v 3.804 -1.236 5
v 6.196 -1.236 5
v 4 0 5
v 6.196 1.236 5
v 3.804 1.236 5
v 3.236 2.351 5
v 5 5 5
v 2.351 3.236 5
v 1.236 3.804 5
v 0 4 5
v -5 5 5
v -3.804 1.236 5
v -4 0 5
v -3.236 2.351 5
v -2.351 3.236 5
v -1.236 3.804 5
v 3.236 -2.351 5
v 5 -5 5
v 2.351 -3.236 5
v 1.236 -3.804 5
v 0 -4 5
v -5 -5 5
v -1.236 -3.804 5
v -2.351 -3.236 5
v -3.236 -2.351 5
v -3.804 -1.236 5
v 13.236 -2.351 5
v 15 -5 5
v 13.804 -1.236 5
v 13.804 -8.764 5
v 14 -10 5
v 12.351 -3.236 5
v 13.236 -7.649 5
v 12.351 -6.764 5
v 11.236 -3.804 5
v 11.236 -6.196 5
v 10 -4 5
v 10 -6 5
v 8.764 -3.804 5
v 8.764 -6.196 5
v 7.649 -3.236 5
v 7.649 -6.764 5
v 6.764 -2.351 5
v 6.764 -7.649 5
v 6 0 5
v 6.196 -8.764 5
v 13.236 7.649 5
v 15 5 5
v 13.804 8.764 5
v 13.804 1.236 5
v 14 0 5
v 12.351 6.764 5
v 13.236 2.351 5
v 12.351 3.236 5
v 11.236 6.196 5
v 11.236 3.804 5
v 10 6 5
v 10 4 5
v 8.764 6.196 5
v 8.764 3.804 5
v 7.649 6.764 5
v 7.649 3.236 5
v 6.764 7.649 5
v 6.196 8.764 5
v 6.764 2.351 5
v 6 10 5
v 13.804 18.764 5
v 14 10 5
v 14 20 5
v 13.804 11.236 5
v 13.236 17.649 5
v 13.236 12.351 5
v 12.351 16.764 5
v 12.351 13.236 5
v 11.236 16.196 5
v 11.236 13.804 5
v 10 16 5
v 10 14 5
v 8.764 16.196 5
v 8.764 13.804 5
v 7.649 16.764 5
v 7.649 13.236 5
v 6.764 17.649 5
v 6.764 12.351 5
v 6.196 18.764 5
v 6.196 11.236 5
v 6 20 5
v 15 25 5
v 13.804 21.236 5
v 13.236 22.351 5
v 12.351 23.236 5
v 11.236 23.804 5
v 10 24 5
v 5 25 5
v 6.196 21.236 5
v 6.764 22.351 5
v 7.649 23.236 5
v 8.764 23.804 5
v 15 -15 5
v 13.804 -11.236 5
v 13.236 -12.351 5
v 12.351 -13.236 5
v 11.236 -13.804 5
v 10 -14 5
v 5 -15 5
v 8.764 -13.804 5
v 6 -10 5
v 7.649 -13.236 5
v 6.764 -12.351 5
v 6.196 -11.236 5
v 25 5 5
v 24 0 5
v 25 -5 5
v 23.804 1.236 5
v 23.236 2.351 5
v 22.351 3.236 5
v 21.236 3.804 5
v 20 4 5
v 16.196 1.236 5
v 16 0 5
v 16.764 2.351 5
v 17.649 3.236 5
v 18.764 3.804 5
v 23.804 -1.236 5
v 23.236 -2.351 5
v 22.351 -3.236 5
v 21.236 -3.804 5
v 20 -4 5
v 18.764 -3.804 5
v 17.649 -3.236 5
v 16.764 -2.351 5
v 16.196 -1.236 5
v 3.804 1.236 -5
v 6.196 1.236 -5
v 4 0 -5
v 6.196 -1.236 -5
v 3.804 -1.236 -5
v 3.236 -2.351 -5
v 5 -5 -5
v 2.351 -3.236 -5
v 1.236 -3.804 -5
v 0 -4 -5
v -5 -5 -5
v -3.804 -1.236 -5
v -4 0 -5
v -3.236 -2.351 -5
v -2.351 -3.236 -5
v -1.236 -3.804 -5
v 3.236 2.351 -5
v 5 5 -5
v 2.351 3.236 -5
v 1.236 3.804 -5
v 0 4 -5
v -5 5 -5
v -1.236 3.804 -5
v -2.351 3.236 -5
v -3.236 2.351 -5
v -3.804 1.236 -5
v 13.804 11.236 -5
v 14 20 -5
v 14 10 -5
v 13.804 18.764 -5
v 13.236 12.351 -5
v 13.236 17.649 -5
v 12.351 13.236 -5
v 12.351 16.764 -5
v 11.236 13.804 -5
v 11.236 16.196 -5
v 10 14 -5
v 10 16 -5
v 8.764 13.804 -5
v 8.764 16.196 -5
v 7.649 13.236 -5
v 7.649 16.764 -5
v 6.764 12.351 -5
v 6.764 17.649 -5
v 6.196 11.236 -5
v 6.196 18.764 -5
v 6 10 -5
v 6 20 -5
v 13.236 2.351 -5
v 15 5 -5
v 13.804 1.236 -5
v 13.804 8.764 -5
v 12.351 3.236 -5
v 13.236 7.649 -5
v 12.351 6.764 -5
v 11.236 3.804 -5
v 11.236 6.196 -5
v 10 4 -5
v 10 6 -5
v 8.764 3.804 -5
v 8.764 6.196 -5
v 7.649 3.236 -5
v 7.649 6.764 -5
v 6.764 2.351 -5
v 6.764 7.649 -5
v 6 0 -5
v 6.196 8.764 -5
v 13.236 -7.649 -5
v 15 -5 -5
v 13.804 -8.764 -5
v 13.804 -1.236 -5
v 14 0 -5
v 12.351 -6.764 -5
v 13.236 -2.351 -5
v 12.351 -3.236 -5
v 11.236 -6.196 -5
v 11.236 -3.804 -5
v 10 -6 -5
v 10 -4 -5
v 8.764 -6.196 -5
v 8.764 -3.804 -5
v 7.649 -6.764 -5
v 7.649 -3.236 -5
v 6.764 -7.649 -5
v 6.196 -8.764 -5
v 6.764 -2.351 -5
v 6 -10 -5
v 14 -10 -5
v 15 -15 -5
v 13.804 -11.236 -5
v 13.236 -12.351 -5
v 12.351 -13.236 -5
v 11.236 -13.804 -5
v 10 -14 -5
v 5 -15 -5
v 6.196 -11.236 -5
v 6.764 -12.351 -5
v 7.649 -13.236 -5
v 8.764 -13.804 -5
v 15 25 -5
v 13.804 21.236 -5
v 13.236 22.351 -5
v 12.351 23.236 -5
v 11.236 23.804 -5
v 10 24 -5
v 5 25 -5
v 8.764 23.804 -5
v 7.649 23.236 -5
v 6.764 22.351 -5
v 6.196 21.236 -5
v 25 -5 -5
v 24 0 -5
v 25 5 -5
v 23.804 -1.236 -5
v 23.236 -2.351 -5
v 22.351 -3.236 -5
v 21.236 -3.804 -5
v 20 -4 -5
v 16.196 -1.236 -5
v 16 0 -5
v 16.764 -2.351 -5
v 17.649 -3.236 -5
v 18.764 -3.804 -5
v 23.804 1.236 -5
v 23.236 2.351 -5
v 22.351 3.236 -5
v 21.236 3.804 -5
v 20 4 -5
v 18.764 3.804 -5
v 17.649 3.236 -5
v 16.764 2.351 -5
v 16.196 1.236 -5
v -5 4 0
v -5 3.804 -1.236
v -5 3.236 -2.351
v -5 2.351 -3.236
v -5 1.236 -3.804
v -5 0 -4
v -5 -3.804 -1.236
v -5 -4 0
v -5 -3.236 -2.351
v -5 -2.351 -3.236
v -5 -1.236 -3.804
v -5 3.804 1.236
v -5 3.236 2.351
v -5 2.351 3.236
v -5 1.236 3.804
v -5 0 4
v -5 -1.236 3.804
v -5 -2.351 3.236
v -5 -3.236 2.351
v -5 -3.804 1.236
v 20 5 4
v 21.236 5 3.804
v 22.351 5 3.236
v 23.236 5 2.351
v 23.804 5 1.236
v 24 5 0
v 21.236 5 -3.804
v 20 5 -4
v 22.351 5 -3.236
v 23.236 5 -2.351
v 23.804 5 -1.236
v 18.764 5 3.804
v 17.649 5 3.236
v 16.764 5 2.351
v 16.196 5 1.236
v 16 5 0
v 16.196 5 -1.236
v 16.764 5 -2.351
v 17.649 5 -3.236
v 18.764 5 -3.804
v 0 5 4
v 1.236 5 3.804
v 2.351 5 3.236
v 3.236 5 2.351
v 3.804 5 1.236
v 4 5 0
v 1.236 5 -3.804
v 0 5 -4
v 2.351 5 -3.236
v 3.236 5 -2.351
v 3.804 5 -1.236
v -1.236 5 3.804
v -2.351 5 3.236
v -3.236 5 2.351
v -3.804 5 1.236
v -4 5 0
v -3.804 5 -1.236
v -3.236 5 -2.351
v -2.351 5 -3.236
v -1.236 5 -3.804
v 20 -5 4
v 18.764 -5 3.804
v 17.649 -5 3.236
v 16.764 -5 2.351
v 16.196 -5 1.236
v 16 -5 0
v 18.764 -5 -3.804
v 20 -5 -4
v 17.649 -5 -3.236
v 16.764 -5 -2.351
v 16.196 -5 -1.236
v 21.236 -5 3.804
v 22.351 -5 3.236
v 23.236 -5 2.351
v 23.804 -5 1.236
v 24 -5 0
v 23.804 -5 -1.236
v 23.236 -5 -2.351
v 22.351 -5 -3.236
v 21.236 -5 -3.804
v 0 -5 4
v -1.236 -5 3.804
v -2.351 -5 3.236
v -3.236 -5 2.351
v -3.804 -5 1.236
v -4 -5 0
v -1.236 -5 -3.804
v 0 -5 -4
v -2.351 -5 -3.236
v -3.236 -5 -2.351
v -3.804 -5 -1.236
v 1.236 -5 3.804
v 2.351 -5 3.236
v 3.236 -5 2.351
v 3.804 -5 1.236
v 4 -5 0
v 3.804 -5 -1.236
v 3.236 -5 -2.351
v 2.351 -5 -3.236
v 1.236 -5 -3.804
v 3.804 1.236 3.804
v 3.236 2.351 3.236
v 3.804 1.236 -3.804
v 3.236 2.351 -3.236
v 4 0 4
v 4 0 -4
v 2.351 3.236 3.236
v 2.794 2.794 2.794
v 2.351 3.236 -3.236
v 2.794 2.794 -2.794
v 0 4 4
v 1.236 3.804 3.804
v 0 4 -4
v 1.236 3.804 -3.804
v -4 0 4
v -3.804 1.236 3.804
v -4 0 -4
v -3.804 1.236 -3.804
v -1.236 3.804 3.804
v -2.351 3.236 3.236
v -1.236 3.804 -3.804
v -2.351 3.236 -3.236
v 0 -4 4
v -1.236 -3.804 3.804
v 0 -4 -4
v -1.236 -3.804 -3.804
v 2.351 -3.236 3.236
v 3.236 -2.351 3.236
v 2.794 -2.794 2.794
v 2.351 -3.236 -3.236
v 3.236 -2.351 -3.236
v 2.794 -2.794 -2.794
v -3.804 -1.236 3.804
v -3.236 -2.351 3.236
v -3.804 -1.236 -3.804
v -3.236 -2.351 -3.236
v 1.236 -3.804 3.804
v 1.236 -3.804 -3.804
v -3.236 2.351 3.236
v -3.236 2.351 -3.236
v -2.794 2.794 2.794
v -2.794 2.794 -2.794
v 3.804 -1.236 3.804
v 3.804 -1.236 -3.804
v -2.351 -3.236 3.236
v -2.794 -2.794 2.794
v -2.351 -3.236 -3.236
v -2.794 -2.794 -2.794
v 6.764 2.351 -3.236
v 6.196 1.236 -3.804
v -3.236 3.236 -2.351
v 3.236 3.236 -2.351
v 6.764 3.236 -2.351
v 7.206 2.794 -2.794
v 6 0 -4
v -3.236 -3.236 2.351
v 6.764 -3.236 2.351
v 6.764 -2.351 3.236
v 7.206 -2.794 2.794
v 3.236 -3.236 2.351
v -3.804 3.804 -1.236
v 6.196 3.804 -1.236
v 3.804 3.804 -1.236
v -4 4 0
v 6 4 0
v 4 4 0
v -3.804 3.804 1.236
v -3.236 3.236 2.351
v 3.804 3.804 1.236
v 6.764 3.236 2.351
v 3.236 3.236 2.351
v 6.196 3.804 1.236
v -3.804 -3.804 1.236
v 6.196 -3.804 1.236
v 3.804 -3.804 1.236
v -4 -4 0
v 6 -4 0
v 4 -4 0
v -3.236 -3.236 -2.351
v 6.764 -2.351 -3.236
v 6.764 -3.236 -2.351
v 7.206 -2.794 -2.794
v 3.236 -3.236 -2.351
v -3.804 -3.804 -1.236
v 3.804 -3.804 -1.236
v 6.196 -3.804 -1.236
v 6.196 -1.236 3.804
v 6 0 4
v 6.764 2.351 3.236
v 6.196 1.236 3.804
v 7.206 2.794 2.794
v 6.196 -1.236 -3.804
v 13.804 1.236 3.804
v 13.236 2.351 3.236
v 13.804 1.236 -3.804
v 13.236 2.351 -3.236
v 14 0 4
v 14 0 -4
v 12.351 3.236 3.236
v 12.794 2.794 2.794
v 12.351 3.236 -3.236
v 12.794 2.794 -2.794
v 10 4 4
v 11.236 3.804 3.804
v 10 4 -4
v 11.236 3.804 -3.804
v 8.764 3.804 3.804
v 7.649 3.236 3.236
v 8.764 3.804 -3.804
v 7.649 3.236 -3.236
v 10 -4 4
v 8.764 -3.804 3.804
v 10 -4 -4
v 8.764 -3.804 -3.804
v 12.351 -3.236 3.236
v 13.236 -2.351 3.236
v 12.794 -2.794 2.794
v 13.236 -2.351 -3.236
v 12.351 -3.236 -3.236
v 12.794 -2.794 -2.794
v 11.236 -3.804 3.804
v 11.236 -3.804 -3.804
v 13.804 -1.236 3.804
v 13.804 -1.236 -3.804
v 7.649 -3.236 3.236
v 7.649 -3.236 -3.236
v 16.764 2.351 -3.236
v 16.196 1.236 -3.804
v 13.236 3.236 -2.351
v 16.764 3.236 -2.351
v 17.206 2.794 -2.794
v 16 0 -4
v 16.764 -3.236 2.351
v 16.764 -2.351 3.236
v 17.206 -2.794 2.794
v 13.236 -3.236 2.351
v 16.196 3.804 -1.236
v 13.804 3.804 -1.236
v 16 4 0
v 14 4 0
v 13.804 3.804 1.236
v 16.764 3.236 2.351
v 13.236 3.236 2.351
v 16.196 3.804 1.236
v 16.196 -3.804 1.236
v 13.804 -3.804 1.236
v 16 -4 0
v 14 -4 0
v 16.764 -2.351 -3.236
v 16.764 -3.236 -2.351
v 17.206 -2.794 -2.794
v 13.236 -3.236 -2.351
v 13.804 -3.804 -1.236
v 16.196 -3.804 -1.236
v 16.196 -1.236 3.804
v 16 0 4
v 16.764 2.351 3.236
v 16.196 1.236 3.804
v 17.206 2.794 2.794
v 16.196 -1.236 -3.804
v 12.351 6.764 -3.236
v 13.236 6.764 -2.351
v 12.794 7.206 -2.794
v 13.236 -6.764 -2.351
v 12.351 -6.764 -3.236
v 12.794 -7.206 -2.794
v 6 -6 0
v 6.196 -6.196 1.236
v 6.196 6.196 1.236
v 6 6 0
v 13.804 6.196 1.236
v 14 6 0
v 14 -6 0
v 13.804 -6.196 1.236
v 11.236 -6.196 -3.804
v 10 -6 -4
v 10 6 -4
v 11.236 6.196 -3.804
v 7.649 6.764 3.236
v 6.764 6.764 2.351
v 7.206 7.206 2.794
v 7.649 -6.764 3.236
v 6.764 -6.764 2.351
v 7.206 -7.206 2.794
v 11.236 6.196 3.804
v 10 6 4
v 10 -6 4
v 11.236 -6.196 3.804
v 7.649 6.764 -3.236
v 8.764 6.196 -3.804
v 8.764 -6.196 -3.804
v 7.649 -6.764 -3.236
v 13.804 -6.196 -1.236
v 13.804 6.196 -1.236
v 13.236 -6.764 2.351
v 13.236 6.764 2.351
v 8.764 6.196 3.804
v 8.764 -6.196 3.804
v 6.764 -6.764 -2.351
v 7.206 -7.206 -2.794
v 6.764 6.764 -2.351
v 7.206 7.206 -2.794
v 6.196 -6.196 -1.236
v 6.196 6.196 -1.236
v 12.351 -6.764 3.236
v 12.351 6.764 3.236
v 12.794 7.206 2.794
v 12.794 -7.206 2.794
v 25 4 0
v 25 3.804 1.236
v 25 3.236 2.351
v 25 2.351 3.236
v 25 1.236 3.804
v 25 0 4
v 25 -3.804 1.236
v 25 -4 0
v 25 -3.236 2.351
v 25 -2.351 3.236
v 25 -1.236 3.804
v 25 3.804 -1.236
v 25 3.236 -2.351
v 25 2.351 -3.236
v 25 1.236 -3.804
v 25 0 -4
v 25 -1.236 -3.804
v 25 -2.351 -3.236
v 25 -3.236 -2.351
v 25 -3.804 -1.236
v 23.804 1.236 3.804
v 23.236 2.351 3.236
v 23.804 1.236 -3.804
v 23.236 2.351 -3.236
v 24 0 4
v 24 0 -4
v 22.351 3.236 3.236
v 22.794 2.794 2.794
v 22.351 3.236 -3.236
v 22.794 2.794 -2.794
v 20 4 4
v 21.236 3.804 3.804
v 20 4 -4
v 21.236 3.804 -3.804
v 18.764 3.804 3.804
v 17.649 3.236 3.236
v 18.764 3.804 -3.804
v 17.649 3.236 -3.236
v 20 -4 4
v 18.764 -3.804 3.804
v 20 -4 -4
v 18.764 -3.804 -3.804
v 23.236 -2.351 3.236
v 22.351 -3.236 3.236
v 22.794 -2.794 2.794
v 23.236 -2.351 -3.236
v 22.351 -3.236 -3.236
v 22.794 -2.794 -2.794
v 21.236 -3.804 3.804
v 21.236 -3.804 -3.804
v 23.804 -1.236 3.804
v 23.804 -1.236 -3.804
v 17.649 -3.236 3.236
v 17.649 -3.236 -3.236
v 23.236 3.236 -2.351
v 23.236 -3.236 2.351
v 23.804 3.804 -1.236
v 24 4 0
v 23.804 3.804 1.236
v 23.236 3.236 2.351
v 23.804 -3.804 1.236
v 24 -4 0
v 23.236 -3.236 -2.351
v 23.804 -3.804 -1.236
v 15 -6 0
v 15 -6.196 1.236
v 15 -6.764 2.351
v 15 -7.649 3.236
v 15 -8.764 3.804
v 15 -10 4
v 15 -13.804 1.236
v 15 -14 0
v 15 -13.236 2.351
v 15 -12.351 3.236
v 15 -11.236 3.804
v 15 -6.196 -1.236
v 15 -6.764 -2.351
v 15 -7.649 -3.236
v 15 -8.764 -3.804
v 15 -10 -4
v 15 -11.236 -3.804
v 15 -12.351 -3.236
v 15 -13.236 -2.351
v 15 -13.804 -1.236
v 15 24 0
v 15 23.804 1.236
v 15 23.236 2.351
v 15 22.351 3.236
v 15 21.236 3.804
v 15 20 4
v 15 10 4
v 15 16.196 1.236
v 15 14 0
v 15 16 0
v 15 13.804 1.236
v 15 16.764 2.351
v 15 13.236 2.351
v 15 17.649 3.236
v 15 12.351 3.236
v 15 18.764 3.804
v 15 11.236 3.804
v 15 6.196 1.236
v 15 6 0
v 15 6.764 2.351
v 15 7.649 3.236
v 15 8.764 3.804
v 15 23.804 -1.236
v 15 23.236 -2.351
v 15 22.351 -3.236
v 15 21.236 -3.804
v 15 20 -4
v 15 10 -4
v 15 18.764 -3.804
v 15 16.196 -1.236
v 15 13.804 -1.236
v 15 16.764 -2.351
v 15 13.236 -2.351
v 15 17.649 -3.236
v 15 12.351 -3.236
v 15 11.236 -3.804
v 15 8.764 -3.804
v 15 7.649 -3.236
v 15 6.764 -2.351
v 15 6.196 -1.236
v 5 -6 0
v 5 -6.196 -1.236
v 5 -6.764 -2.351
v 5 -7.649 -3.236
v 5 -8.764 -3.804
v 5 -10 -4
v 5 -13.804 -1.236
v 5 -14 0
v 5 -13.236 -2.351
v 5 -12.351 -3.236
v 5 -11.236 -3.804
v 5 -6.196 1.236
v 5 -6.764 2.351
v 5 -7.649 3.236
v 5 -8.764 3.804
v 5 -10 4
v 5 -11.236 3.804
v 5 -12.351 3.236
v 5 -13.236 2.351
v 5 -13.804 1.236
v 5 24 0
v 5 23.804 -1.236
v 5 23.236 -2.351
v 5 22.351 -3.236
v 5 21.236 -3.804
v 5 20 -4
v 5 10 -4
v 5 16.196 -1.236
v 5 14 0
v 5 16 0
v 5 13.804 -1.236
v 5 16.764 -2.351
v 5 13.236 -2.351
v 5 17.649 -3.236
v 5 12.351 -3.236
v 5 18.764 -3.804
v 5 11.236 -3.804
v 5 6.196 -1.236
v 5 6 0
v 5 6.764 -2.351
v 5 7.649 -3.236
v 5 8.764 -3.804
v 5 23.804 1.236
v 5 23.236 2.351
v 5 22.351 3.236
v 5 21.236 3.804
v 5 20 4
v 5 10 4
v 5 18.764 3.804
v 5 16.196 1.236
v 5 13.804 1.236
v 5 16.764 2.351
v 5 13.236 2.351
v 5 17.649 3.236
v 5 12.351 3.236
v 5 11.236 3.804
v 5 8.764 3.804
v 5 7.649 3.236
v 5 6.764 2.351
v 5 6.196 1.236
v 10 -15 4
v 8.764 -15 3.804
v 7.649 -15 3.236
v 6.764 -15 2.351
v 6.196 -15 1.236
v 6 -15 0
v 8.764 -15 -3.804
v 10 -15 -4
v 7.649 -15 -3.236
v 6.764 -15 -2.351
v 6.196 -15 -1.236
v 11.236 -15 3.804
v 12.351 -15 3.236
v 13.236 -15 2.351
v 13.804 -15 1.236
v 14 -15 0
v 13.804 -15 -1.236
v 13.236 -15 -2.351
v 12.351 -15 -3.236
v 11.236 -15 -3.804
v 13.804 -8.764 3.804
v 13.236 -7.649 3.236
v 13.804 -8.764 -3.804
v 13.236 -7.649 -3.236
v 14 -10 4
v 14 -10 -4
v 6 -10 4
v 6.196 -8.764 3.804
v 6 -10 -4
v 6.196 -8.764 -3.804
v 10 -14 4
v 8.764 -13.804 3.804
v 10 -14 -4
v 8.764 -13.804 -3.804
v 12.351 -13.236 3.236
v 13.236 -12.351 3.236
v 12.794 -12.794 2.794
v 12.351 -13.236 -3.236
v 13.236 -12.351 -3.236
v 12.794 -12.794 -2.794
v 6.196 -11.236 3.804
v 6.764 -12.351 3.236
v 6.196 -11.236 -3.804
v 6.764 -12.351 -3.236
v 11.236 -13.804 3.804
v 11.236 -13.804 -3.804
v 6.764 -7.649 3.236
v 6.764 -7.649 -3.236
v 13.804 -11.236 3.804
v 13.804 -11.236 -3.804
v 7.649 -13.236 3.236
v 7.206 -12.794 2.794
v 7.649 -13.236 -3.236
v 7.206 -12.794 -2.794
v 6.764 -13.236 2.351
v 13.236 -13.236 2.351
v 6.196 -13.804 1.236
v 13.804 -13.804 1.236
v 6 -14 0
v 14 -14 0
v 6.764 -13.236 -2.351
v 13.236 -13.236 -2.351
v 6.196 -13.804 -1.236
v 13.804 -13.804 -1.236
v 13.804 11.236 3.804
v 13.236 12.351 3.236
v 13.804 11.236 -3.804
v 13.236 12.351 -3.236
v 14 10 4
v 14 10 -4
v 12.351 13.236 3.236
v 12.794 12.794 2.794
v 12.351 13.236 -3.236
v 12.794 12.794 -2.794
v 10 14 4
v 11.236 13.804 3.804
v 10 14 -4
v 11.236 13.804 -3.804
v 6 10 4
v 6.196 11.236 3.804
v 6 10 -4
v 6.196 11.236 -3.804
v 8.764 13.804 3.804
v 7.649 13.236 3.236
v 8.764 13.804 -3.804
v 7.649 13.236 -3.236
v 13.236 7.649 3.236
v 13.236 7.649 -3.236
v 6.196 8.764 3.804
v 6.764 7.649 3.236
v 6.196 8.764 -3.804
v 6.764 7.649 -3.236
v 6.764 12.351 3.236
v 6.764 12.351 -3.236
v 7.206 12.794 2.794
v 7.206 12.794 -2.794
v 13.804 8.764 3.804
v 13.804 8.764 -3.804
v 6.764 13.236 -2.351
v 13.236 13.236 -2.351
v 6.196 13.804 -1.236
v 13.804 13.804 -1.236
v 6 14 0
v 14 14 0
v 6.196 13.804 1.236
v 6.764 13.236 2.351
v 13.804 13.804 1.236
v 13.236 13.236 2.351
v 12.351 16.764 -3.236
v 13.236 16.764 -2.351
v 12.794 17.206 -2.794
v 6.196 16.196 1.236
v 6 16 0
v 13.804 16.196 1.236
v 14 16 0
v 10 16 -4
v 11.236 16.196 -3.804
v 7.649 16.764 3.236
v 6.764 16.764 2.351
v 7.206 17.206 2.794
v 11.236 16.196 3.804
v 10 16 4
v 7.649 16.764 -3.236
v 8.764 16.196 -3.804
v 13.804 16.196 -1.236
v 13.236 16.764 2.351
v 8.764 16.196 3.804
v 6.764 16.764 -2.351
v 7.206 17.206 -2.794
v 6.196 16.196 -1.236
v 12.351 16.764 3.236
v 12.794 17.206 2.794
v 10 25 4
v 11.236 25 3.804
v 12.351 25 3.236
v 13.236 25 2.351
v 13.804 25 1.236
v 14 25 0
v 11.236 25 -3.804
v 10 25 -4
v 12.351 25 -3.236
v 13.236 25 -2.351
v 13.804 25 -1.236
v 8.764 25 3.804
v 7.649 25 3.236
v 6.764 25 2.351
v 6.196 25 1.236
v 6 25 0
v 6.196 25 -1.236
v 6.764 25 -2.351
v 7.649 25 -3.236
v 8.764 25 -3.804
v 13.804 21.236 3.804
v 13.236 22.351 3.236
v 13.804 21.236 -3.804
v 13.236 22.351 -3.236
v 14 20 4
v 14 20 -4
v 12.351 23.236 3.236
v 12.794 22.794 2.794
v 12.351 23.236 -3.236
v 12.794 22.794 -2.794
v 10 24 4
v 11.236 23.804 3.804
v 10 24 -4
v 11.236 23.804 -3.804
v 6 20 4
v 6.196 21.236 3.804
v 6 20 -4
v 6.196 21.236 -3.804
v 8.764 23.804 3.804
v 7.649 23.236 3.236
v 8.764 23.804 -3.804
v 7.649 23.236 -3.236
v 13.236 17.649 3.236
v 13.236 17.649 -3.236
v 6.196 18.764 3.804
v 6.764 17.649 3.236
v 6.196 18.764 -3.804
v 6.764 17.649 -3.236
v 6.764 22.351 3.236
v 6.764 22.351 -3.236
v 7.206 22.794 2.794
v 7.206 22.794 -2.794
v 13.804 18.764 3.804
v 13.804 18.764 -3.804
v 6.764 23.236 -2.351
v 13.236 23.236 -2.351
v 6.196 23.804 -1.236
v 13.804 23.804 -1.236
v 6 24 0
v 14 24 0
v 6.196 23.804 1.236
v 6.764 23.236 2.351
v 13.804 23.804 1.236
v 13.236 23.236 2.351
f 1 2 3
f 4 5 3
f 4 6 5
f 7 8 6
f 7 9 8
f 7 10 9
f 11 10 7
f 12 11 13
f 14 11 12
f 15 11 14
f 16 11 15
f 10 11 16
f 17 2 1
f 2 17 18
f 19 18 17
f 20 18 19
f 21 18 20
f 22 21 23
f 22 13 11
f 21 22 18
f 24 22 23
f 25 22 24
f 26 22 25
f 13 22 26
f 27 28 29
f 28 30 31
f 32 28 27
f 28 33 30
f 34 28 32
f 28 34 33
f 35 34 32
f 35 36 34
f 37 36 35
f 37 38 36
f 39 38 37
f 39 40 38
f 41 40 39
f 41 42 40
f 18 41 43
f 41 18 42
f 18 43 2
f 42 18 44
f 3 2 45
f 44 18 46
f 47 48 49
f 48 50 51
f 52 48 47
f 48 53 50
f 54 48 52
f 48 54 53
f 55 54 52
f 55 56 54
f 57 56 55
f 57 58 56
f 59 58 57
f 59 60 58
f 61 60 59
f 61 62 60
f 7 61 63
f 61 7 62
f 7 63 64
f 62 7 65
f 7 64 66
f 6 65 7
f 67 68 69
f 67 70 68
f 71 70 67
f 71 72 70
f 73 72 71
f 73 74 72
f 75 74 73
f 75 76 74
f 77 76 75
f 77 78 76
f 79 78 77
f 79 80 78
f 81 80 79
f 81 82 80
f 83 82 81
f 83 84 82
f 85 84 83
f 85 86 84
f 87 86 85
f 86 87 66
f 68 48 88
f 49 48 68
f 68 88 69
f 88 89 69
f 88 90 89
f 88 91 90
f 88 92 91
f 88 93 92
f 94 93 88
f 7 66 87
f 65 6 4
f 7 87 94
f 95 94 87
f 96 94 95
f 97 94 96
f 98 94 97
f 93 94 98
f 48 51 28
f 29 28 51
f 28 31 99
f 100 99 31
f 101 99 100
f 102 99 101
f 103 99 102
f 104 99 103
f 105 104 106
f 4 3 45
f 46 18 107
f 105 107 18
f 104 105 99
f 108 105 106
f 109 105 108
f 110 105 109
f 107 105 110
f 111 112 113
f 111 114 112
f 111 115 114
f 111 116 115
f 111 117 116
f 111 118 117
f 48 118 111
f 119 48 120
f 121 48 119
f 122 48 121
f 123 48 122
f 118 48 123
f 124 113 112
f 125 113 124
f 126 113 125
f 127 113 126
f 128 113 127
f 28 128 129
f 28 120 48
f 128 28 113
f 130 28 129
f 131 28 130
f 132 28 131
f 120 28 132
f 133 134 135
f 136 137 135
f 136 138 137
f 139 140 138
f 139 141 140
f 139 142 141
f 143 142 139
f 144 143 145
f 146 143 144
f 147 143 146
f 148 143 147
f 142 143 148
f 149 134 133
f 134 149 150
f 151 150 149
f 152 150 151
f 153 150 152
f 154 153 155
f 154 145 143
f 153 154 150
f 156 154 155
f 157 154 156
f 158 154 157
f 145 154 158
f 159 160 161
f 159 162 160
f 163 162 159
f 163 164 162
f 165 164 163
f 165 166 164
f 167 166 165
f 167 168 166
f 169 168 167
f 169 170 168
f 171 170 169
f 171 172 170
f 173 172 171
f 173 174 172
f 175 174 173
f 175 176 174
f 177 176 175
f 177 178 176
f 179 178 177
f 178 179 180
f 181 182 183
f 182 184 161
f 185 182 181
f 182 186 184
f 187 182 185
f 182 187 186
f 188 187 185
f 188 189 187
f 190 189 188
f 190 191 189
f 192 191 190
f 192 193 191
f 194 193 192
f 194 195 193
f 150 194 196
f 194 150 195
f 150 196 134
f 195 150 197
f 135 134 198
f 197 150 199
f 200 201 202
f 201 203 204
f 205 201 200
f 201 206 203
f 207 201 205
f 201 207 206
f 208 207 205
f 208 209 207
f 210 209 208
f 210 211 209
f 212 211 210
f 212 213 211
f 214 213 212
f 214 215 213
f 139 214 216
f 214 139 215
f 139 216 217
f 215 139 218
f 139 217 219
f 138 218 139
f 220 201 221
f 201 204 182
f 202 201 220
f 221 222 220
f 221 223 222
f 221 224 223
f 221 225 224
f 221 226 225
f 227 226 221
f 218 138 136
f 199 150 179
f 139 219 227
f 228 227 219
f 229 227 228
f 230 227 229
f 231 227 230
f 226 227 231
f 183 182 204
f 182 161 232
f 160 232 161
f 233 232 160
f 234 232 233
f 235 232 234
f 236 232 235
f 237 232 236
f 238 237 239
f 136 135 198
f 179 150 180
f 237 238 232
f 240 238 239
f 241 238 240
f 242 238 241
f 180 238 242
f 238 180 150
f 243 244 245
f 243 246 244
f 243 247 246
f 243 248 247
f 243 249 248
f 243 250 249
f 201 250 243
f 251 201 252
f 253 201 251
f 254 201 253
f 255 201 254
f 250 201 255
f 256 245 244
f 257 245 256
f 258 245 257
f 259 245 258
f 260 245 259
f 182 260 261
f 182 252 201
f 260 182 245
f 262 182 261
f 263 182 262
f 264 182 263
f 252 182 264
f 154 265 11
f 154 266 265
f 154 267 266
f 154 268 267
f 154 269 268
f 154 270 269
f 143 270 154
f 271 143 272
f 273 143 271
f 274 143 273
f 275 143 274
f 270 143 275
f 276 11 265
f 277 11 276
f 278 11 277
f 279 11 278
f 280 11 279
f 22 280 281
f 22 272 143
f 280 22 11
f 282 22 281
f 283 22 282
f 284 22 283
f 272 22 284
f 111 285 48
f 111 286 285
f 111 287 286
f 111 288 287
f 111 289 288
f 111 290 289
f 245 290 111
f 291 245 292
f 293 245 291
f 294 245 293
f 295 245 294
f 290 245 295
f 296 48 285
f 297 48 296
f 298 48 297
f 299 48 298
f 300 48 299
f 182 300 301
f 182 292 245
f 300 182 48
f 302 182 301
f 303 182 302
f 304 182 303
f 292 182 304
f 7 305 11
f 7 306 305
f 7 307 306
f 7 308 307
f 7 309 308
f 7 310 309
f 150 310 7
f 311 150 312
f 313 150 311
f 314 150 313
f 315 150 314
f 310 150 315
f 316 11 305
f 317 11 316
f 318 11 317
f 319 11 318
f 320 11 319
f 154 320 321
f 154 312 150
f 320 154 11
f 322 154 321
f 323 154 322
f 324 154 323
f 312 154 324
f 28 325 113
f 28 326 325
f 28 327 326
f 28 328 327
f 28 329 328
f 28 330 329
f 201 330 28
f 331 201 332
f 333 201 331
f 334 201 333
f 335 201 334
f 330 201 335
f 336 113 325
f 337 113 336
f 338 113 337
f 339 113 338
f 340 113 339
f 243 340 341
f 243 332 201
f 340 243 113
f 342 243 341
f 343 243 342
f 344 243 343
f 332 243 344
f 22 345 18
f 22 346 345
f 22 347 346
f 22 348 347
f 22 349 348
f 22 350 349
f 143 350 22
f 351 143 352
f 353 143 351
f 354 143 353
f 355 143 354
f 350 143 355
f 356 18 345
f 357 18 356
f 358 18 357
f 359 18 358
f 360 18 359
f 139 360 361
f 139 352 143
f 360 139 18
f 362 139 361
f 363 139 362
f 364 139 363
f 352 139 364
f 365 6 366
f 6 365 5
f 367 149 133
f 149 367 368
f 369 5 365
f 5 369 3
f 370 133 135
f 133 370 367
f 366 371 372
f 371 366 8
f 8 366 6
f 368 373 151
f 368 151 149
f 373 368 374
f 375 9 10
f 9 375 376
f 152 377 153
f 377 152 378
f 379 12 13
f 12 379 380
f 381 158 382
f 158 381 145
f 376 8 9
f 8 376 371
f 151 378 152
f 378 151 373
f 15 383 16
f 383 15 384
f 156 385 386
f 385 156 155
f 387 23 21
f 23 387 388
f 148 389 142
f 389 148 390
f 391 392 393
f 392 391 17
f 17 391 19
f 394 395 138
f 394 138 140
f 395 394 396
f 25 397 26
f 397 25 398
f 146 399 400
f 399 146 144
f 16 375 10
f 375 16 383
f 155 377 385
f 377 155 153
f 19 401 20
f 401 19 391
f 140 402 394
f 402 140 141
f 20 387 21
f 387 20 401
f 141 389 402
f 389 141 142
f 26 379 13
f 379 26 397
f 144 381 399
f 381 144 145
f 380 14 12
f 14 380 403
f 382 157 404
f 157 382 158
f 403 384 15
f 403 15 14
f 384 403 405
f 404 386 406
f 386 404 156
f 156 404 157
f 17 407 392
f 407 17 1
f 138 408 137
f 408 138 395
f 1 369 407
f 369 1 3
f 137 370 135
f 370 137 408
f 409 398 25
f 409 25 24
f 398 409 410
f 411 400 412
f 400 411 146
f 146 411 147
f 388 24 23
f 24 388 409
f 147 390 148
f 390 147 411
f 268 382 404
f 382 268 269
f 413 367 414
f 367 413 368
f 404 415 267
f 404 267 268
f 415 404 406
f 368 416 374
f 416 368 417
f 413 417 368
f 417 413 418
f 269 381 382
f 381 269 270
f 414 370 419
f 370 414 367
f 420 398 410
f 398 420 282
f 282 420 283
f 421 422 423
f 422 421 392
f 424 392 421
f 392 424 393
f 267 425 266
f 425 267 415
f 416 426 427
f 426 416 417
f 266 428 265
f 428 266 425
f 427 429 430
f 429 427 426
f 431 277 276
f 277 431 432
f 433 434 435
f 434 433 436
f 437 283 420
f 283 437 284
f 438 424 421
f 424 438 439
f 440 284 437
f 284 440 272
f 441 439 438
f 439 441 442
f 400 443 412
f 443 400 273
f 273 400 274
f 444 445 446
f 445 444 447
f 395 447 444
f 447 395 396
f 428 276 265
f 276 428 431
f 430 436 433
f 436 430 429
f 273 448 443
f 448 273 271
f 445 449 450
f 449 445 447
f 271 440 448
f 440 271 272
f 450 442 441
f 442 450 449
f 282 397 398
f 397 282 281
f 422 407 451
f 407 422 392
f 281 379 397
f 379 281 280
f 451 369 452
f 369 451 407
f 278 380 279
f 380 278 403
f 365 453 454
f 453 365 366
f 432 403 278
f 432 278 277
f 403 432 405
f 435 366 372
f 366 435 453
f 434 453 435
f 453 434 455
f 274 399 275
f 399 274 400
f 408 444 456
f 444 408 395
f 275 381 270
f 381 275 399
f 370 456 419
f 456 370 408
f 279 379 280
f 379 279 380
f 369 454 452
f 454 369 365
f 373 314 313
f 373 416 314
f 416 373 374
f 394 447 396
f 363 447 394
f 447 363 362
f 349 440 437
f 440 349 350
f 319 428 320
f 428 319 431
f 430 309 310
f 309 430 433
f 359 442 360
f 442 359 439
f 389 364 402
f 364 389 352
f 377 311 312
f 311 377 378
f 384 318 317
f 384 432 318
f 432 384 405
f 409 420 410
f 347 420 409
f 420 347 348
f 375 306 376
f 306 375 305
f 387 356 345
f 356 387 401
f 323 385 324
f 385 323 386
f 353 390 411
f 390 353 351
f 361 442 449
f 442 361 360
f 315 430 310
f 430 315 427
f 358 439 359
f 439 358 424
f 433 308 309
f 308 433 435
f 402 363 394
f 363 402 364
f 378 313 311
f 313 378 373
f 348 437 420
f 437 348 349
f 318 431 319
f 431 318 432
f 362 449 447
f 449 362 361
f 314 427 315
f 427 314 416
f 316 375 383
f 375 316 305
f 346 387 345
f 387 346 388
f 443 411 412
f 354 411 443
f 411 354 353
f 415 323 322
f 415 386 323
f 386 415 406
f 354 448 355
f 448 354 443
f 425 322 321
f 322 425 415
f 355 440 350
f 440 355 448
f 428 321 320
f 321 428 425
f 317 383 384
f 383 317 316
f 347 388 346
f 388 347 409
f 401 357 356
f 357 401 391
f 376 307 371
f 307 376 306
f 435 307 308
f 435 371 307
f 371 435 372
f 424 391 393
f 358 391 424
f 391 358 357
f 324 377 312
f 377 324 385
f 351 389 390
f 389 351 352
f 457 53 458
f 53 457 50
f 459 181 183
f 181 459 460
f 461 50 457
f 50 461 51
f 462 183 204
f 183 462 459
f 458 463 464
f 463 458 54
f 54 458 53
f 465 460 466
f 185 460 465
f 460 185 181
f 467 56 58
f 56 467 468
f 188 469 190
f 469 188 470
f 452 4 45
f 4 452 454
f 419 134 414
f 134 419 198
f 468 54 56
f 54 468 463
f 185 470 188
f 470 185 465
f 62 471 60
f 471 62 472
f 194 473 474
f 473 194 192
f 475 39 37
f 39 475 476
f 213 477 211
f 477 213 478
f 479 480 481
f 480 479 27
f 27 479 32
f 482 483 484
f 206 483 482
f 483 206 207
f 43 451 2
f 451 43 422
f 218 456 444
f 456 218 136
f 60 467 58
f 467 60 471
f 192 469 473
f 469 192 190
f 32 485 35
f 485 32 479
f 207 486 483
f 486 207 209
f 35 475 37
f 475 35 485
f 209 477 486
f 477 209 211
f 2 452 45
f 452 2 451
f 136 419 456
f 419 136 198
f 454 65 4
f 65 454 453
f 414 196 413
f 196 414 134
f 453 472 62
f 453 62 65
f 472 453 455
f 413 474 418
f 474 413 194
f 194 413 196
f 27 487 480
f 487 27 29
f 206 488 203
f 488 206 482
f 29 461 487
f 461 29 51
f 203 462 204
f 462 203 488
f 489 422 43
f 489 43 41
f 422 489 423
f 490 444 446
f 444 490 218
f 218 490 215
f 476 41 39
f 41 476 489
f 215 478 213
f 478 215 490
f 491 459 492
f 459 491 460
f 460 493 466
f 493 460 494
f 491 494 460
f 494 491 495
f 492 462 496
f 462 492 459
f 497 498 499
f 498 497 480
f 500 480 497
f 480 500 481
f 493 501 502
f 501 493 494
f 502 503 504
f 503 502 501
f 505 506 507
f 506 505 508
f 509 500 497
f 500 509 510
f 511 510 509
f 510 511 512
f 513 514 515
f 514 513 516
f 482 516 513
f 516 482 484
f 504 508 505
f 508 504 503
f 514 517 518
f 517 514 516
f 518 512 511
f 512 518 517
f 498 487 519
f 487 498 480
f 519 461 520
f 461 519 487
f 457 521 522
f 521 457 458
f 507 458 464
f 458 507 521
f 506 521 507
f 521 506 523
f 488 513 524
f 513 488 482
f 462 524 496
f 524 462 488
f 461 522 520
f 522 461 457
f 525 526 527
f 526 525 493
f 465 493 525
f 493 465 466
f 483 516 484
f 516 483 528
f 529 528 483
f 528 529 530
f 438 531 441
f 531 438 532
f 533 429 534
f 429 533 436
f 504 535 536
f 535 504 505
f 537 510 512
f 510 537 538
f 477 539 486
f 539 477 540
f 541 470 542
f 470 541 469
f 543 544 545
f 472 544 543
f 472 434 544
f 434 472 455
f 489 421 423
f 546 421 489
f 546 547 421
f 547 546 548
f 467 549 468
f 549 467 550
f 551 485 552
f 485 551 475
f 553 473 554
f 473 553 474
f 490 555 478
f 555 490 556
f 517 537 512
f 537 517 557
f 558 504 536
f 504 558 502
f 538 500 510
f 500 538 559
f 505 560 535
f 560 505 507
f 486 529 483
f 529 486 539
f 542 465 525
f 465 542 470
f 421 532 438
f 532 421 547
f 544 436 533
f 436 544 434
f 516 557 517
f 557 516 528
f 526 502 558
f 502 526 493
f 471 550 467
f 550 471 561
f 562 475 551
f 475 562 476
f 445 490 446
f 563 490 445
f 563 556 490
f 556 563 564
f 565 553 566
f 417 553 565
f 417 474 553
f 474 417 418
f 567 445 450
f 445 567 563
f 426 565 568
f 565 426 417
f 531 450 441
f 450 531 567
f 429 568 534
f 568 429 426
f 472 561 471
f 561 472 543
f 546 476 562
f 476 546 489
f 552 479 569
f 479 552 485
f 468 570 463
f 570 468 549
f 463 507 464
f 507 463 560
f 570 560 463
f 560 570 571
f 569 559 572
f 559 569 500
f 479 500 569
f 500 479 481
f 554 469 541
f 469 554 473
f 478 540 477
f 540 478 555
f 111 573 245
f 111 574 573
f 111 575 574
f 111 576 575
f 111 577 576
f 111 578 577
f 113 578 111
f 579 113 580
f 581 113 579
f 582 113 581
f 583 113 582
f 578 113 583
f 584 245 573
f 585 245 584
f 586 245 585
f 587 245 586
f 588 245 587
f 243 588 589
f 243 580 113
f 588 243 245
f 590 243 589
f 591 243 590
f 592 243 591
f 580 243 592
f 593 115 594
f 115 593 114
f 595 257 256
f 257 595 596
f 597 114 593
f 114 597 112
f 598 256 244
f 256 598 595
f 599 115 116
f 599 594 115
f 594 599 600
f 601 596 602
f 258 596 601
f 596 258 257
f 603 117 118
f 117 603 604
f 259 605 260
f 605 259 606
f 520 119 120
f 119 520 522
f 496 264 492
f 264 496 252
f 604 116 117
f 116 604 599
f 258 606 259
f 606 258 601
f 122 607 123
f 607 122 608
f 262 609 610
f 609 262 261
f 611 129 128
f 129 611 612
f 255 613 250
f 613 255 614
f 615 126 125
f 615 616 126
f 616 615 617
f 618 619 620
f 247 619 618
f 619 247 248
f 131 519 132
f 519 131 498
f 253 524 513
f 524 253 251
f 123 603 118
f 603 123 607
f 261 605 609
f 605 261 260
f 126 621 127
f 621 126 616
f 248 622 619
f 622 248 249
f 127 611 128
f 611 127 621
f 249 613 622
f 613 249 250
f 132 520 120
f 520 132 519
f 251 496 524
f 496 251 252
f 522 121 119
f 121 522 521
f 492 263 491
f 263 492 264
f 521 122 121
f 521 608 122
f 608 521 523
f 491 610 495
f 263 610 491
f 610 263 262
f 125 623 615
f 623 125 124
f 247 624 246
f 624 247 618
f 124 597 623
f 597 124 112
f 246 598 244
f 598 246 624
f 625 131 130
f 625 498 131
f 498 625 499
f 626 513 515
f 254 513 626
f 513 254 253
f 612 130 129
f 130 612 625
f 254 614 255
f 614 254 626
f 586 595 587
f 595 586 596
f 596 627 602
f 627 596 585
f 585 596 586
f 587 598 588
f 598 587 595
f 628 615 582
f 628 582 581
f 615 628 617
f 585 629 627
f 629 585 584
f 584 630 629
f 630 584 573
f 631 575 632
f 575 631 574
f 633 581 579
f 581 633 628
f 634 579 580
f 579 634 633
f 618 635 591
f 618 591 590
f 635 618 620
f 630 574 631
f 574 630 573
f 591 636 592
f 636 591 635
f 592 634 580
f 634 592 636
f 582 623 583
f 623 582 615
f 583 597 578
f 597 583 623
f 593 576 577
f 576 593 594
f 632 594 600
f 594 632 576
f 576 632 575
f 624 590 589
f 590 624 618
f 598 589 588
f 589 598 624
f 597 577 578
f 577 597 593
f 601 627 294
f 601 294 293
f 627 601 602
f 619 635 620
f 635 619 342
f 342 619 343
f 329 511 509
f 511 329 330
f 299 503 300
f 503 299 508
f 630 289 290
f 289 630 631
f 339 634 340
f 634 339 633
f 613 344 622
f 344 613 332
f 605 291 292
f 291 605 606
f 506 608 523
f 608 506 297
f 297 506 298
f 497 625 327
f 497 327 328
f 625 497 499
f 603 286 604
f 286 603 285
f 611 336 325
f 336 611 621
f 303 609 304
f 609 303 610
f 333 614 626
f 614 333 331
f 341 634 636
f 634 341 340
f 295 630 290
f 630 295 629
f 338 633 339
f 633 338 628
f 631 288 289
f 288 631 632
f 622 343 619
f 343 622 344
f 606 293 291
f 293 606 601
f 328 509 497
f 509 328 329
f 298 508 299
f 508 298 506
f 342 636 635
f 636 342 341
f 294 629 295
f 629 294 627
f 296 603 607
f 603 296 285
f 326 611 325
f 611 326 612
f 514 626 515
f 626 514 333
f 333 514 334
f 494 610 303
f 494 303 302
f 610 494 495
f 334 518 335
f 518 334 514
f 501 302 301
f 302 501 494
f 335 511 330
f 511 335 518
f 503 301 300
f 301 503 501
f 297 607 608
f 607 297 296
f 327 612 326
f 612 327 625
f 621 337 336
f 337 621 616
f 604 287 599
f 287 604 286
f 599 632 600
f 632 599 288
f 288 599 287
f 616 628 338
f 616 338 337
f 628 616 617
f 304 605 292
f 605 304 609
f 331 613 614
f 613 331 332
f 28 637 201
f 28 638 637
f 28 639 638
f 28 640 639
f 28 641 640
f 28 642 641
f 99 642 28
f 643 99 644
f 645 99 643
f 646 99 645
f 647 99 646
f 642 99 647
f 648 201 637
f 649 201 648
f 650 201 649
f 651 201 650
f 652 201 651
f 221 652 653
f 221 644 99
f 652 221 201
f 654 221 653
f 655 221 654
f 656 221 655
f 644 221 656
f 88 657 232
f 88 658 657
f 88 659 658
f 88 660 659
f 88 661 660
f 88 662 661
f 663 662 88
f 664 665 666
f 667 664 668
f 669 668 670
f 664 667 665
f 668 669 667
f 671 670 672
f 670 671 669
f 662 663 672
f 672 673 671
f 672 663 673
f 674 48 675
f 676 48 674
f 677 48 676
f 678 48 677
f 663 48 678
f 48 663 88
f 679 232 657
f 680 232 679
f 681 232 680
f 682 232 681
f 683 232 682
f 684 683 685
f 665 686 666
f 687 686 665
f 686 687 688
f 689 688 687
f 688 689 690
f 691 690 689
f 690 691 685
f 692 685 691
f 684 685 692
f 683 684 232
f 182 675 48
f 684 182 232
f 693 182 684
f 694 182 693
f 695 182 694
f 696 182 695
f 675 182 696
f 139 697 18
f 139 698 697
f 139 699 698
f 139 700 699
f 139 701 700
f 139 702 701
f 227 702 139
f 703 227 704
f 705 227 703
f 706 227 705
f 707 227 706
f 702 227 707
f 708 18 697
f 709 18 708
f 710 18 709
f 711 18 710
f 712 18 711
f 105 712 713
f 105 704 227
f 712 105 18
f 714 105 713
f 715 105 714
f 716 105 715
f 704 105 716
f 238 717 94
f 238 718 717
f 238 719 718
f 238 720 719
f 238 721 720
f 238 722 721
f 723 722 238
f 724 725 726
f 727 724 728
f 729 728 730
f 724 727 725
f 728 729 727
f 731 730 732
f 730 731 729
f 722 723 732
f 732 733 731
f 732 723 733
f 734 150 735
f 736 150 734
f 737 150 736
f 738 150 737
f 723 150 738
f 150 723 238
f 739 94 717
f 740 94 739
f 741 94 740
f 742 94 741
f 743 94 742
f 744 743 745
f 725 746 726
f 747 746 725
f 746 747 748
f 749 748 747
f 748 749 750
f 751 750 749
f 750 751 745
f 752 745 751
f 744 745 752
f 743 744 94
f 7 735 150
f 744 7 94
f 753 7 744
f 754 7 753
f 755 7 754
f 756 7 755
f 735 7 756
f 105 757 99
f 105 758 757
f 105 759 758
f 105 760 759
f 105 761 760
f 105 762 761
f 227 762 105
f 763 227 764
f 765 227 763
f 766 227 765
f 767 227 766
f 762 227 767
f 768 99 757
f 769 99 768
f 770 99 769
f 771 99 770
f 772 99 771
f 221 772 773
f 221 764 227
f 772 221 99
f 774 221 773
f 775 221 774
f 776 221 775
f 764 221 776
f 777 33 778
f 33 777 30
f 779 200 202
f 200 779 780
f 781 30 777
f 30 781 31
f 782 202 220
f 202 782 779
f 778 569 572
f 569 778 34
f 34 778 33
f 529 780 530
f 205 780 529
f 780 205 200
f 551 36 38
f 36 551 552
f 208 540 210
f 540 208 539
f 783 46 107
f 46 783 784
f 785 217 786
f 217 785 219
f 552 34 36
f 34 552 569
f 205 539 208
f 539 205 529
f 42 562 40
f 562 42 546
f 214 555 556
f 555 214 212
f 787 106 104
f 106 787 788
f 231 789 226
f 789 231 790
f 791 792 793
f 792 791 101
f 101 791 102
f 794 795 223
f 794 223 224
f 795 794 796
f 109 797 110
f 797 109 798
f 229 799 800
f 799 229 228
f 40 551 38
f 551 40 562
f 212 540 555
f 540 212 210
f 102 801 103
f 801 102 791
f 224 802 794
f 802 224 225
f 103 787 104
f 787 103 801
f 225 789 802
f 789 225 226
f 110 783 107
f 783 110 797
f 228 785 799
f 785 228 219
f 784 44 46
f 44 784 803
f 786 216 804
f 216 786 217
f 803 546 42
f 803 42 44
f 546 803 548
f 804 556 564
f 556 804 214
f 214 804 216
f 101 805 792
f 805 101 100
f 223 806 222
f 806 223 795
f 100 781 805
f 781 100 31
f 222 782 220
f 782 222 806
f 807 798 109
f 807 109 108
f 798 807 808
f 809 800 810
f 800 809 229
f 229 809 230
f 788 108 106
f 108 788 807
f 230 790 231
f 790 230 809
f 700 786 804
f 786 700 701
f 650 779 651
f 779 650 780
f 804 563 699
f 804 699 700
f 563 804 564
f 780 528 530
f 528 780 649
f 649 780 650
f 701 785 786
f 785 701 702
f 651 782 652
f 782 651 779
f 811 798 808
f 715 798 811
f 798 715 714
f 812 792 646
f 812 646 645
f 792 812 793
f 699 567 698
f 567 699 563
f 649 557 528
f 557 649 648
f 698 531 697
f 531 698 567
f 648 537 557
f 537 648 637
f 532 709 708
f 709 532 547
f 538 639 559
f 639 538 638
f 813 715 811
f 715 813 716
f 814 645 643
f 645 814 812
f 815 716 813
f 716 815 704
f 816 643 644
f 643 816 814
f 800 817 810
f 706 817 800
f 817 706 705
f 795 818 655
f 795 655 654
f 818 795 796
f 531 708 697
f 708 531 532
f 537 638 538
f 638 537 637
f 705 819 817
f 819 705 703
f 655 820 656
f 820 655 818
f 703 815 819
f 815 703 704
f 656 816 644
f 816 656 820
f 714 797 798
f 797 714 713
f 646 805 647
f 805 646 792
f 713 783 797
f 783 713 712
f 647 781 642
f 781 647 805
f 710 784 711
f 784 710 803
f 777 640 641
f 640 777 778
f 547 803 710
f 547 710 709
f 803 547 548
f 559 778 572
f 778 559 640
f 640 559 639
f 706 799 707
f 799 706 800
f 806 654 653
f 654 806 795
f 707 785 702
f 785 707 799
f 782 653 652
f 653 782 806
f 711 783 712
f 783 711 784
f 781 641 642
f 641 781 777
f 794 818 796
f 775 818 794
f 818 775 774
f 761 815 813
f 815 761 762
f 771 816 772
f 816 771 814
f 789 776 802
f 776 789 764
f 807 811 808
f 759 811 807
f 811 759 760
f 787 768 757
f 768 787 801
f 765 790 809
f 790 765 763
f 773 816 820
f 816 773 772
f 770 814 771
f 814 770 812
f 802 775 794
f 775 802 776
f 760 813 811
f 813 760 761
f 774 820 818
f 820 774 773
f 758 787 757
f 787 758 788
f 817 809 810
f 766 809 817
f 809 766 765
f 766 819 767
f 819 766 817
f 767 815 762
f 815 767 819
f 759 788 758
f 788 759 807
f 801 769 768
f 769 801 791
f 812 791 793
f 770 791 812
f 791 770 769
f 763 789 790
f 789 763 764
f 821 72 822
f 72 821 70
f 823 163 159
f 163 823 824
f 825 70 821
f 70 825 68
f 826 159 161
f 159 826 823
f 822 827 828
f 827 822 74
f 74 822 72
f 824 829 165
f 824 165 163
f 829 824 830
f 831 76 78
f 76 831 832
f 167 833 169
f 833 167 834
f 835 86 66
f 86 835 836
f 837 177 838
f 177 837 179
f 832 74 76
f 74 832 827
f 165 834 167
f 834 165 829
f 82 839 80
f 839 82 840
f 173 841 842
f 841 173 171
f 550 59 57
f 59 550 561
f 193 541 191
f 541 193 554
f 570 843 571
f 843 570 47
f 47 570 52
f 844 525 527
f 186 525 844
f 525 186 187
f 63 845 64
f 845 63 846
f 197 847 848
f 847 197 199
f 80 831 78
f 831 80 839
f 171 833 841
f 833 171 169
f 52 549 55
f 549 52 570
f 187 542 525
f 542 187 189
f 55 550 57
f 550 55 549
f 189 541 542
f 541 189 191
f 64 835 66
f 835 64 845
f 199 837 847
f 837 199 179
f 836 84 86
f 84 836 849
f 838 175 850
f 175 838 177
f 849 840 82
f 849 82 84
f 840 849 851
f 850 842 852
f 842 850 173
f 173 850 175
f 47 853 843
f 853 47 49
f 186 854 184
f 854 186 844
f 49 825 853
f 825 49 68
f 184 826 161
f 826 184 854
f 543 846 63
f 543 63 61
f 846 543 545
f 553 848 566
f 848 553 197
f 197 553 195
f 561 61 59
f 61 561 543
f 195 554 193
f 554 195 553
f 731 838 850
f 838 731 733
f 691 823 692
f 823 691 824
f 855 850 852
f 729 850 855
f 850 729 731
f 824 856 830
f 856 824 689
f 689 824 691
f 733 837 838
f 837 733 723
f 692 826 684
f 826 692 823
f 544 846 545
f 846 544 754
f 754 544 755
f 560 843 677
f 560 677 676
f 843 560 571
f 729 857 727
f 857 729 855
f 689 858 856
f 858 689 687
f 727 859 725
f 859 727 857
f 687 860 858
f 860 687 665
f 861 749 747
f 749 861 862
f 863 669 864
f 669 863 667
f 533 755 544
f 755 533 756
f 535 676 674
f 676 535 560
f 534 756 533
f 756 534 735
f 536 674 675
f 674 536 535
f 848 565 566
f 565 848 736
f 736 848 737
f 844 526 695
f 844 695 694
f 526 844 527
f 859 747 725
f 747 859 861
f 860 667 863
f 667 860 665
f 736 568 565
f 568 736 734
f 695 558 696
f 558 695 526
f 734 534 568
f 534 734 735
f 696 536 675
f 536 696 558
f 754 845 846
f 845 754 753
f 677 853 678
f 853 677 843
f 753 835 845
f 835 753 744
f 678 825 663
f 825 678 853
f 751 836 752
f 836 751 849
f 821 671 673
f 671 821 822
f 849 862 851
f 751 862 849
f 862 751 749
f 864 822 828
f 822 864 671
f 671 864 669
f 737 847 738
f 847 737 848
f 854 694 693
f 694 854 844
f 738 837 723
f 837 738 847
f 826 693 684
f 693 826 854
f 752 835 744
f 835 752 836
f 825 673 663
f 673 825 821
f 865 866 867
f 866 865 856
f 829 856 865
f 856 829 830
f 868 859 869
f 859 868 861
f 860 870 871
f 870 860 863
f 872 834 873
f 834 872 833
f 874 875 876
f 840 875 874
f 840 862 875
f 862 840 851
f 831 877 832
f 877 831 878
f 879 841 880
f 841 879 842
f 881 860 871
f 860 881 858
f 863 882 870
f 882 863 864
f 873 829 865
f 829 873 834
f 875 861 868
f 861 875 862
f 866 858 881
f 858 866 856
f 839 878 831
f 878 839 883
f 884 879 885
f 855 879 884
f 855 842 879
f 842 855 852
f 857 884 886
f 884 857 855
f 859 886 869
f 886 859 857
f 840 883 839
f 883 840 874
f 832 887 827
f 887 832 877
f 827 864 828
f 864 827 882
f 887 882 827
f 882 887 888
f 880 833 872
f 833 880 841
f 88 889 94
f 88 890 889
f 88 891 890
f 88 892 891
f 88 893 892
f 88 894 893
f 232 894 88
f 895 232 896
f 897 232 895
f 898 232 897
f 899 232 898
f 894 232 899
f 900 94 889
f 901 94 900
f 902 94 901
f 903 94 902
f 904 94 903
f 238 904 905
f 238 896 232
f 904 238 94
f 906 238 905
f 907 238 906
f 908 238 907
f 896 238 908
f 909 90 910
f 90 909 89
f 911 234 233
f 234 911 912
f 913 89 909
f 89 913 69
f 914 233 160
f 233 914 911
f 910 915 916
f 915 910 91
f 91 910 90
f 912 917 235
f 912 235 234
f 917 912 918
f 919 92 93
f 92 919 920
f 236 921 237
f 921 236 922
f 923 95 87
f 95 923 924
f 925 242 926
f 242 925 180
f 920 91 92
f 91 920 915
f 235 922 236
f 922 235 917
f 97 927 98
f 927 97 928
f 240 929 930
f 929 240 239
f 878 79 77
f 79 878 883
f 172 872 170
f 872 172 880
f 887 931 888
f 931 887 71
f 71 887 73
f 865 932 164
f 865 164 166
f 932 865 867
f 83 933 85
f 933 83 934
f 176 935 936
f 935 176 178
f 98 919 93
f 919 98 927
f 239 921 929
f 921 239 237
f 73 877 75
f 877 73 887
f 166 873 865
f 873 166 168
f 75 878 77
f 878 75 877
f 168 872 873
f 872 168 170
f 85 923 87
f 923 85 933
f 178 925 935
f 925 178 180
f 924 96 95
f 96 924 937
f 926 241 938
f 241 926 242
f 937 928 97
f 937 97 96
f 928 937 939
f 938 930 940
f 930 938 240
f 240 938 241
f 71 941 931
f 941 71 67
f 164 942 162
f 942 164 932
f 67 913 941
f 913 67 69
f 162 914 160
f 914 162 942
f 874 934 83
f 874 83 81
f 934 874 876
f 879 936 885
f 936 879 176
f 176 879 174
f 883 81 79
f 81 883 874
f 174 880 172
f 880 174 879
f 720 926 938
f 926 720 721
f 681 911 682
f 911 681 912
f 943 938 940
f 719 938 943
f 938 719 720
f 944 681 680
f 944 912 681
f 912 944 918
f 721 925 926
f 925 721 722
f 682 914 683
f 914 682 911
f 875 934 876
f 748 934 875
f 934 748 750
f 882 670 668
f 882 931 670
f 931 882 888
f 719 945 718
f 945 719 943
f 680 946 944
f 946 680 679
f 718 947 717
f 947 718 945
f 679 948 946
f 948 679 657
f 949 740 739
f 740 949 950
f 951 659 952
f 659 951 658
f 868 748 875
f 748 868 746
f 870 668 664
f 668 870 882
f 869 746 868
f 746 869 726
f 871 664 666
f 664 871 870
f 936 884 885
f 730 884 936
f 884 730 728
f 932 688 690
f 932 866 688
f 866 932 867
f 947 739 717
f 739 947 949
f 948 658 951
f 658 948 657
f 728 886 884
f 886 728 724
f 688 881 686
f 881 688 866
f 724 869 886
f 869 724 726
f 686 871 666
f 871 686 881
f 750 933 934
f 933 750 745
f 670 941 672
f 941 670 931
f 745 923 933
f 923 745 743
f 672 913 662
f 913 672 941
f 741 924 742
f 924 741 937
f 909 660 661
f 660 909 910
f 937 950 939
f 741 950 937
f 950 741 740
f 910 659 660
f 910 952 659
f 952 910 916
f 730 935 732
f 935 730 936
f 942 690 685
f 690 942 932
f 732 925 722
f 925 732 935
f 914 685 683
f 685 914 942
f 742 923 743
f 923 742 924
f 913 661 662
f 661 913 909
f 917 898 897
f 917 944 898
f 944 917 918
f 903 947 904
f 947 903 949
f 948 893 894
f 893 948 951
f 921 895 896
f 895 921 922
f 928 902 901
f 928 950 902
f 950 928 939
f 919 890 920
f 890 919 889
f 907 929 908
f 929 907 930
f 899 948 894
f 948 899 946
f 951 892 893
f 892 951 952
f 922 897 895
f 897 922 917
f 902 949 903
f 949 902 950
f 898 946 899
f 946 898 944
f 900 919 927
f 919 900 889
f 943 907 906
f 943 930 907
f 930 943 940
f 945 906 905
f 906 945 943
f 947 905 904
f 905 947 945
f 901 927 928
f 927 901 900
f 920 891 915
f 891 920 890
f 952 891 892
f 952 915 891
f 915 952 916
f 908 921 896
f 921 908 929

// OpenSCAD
Cross_Block();
//T_Block();
//translate([50,0,0]) L_Block();
//Block();

module T_Block()
{
    union()
    {
        Block1(3);
        translate([10,0,0]) Block2(4);
    }
}
module L_Block()
{
    union()
    {
        Block1(4);
        Block2(2);
    }
}
module Cross_Block()
{
    Block1(3);
    translate([10,-10,0])Block2(4);
}
module Block2(length)
{
    for(i=[0:length-1])
        translate([0,10*i,0]) Block();
}

module Block1(length)
{
    for(i=[0:length-1])
        translate([10*i,0,0]) Block();
}

module Block()
{
    difference() 
    {   
        cube([10,10,10], true);
        shape();
        rotate([0,90,0]) shape();
        rotate([90,90,0]) shape();
    }
}

module shape()
{
    cylinder(15,4,4,true,$fn =20);
    //cube([7,7,12], true);
    //cylinder(15,4,4,true,$fn =3);
    
}
